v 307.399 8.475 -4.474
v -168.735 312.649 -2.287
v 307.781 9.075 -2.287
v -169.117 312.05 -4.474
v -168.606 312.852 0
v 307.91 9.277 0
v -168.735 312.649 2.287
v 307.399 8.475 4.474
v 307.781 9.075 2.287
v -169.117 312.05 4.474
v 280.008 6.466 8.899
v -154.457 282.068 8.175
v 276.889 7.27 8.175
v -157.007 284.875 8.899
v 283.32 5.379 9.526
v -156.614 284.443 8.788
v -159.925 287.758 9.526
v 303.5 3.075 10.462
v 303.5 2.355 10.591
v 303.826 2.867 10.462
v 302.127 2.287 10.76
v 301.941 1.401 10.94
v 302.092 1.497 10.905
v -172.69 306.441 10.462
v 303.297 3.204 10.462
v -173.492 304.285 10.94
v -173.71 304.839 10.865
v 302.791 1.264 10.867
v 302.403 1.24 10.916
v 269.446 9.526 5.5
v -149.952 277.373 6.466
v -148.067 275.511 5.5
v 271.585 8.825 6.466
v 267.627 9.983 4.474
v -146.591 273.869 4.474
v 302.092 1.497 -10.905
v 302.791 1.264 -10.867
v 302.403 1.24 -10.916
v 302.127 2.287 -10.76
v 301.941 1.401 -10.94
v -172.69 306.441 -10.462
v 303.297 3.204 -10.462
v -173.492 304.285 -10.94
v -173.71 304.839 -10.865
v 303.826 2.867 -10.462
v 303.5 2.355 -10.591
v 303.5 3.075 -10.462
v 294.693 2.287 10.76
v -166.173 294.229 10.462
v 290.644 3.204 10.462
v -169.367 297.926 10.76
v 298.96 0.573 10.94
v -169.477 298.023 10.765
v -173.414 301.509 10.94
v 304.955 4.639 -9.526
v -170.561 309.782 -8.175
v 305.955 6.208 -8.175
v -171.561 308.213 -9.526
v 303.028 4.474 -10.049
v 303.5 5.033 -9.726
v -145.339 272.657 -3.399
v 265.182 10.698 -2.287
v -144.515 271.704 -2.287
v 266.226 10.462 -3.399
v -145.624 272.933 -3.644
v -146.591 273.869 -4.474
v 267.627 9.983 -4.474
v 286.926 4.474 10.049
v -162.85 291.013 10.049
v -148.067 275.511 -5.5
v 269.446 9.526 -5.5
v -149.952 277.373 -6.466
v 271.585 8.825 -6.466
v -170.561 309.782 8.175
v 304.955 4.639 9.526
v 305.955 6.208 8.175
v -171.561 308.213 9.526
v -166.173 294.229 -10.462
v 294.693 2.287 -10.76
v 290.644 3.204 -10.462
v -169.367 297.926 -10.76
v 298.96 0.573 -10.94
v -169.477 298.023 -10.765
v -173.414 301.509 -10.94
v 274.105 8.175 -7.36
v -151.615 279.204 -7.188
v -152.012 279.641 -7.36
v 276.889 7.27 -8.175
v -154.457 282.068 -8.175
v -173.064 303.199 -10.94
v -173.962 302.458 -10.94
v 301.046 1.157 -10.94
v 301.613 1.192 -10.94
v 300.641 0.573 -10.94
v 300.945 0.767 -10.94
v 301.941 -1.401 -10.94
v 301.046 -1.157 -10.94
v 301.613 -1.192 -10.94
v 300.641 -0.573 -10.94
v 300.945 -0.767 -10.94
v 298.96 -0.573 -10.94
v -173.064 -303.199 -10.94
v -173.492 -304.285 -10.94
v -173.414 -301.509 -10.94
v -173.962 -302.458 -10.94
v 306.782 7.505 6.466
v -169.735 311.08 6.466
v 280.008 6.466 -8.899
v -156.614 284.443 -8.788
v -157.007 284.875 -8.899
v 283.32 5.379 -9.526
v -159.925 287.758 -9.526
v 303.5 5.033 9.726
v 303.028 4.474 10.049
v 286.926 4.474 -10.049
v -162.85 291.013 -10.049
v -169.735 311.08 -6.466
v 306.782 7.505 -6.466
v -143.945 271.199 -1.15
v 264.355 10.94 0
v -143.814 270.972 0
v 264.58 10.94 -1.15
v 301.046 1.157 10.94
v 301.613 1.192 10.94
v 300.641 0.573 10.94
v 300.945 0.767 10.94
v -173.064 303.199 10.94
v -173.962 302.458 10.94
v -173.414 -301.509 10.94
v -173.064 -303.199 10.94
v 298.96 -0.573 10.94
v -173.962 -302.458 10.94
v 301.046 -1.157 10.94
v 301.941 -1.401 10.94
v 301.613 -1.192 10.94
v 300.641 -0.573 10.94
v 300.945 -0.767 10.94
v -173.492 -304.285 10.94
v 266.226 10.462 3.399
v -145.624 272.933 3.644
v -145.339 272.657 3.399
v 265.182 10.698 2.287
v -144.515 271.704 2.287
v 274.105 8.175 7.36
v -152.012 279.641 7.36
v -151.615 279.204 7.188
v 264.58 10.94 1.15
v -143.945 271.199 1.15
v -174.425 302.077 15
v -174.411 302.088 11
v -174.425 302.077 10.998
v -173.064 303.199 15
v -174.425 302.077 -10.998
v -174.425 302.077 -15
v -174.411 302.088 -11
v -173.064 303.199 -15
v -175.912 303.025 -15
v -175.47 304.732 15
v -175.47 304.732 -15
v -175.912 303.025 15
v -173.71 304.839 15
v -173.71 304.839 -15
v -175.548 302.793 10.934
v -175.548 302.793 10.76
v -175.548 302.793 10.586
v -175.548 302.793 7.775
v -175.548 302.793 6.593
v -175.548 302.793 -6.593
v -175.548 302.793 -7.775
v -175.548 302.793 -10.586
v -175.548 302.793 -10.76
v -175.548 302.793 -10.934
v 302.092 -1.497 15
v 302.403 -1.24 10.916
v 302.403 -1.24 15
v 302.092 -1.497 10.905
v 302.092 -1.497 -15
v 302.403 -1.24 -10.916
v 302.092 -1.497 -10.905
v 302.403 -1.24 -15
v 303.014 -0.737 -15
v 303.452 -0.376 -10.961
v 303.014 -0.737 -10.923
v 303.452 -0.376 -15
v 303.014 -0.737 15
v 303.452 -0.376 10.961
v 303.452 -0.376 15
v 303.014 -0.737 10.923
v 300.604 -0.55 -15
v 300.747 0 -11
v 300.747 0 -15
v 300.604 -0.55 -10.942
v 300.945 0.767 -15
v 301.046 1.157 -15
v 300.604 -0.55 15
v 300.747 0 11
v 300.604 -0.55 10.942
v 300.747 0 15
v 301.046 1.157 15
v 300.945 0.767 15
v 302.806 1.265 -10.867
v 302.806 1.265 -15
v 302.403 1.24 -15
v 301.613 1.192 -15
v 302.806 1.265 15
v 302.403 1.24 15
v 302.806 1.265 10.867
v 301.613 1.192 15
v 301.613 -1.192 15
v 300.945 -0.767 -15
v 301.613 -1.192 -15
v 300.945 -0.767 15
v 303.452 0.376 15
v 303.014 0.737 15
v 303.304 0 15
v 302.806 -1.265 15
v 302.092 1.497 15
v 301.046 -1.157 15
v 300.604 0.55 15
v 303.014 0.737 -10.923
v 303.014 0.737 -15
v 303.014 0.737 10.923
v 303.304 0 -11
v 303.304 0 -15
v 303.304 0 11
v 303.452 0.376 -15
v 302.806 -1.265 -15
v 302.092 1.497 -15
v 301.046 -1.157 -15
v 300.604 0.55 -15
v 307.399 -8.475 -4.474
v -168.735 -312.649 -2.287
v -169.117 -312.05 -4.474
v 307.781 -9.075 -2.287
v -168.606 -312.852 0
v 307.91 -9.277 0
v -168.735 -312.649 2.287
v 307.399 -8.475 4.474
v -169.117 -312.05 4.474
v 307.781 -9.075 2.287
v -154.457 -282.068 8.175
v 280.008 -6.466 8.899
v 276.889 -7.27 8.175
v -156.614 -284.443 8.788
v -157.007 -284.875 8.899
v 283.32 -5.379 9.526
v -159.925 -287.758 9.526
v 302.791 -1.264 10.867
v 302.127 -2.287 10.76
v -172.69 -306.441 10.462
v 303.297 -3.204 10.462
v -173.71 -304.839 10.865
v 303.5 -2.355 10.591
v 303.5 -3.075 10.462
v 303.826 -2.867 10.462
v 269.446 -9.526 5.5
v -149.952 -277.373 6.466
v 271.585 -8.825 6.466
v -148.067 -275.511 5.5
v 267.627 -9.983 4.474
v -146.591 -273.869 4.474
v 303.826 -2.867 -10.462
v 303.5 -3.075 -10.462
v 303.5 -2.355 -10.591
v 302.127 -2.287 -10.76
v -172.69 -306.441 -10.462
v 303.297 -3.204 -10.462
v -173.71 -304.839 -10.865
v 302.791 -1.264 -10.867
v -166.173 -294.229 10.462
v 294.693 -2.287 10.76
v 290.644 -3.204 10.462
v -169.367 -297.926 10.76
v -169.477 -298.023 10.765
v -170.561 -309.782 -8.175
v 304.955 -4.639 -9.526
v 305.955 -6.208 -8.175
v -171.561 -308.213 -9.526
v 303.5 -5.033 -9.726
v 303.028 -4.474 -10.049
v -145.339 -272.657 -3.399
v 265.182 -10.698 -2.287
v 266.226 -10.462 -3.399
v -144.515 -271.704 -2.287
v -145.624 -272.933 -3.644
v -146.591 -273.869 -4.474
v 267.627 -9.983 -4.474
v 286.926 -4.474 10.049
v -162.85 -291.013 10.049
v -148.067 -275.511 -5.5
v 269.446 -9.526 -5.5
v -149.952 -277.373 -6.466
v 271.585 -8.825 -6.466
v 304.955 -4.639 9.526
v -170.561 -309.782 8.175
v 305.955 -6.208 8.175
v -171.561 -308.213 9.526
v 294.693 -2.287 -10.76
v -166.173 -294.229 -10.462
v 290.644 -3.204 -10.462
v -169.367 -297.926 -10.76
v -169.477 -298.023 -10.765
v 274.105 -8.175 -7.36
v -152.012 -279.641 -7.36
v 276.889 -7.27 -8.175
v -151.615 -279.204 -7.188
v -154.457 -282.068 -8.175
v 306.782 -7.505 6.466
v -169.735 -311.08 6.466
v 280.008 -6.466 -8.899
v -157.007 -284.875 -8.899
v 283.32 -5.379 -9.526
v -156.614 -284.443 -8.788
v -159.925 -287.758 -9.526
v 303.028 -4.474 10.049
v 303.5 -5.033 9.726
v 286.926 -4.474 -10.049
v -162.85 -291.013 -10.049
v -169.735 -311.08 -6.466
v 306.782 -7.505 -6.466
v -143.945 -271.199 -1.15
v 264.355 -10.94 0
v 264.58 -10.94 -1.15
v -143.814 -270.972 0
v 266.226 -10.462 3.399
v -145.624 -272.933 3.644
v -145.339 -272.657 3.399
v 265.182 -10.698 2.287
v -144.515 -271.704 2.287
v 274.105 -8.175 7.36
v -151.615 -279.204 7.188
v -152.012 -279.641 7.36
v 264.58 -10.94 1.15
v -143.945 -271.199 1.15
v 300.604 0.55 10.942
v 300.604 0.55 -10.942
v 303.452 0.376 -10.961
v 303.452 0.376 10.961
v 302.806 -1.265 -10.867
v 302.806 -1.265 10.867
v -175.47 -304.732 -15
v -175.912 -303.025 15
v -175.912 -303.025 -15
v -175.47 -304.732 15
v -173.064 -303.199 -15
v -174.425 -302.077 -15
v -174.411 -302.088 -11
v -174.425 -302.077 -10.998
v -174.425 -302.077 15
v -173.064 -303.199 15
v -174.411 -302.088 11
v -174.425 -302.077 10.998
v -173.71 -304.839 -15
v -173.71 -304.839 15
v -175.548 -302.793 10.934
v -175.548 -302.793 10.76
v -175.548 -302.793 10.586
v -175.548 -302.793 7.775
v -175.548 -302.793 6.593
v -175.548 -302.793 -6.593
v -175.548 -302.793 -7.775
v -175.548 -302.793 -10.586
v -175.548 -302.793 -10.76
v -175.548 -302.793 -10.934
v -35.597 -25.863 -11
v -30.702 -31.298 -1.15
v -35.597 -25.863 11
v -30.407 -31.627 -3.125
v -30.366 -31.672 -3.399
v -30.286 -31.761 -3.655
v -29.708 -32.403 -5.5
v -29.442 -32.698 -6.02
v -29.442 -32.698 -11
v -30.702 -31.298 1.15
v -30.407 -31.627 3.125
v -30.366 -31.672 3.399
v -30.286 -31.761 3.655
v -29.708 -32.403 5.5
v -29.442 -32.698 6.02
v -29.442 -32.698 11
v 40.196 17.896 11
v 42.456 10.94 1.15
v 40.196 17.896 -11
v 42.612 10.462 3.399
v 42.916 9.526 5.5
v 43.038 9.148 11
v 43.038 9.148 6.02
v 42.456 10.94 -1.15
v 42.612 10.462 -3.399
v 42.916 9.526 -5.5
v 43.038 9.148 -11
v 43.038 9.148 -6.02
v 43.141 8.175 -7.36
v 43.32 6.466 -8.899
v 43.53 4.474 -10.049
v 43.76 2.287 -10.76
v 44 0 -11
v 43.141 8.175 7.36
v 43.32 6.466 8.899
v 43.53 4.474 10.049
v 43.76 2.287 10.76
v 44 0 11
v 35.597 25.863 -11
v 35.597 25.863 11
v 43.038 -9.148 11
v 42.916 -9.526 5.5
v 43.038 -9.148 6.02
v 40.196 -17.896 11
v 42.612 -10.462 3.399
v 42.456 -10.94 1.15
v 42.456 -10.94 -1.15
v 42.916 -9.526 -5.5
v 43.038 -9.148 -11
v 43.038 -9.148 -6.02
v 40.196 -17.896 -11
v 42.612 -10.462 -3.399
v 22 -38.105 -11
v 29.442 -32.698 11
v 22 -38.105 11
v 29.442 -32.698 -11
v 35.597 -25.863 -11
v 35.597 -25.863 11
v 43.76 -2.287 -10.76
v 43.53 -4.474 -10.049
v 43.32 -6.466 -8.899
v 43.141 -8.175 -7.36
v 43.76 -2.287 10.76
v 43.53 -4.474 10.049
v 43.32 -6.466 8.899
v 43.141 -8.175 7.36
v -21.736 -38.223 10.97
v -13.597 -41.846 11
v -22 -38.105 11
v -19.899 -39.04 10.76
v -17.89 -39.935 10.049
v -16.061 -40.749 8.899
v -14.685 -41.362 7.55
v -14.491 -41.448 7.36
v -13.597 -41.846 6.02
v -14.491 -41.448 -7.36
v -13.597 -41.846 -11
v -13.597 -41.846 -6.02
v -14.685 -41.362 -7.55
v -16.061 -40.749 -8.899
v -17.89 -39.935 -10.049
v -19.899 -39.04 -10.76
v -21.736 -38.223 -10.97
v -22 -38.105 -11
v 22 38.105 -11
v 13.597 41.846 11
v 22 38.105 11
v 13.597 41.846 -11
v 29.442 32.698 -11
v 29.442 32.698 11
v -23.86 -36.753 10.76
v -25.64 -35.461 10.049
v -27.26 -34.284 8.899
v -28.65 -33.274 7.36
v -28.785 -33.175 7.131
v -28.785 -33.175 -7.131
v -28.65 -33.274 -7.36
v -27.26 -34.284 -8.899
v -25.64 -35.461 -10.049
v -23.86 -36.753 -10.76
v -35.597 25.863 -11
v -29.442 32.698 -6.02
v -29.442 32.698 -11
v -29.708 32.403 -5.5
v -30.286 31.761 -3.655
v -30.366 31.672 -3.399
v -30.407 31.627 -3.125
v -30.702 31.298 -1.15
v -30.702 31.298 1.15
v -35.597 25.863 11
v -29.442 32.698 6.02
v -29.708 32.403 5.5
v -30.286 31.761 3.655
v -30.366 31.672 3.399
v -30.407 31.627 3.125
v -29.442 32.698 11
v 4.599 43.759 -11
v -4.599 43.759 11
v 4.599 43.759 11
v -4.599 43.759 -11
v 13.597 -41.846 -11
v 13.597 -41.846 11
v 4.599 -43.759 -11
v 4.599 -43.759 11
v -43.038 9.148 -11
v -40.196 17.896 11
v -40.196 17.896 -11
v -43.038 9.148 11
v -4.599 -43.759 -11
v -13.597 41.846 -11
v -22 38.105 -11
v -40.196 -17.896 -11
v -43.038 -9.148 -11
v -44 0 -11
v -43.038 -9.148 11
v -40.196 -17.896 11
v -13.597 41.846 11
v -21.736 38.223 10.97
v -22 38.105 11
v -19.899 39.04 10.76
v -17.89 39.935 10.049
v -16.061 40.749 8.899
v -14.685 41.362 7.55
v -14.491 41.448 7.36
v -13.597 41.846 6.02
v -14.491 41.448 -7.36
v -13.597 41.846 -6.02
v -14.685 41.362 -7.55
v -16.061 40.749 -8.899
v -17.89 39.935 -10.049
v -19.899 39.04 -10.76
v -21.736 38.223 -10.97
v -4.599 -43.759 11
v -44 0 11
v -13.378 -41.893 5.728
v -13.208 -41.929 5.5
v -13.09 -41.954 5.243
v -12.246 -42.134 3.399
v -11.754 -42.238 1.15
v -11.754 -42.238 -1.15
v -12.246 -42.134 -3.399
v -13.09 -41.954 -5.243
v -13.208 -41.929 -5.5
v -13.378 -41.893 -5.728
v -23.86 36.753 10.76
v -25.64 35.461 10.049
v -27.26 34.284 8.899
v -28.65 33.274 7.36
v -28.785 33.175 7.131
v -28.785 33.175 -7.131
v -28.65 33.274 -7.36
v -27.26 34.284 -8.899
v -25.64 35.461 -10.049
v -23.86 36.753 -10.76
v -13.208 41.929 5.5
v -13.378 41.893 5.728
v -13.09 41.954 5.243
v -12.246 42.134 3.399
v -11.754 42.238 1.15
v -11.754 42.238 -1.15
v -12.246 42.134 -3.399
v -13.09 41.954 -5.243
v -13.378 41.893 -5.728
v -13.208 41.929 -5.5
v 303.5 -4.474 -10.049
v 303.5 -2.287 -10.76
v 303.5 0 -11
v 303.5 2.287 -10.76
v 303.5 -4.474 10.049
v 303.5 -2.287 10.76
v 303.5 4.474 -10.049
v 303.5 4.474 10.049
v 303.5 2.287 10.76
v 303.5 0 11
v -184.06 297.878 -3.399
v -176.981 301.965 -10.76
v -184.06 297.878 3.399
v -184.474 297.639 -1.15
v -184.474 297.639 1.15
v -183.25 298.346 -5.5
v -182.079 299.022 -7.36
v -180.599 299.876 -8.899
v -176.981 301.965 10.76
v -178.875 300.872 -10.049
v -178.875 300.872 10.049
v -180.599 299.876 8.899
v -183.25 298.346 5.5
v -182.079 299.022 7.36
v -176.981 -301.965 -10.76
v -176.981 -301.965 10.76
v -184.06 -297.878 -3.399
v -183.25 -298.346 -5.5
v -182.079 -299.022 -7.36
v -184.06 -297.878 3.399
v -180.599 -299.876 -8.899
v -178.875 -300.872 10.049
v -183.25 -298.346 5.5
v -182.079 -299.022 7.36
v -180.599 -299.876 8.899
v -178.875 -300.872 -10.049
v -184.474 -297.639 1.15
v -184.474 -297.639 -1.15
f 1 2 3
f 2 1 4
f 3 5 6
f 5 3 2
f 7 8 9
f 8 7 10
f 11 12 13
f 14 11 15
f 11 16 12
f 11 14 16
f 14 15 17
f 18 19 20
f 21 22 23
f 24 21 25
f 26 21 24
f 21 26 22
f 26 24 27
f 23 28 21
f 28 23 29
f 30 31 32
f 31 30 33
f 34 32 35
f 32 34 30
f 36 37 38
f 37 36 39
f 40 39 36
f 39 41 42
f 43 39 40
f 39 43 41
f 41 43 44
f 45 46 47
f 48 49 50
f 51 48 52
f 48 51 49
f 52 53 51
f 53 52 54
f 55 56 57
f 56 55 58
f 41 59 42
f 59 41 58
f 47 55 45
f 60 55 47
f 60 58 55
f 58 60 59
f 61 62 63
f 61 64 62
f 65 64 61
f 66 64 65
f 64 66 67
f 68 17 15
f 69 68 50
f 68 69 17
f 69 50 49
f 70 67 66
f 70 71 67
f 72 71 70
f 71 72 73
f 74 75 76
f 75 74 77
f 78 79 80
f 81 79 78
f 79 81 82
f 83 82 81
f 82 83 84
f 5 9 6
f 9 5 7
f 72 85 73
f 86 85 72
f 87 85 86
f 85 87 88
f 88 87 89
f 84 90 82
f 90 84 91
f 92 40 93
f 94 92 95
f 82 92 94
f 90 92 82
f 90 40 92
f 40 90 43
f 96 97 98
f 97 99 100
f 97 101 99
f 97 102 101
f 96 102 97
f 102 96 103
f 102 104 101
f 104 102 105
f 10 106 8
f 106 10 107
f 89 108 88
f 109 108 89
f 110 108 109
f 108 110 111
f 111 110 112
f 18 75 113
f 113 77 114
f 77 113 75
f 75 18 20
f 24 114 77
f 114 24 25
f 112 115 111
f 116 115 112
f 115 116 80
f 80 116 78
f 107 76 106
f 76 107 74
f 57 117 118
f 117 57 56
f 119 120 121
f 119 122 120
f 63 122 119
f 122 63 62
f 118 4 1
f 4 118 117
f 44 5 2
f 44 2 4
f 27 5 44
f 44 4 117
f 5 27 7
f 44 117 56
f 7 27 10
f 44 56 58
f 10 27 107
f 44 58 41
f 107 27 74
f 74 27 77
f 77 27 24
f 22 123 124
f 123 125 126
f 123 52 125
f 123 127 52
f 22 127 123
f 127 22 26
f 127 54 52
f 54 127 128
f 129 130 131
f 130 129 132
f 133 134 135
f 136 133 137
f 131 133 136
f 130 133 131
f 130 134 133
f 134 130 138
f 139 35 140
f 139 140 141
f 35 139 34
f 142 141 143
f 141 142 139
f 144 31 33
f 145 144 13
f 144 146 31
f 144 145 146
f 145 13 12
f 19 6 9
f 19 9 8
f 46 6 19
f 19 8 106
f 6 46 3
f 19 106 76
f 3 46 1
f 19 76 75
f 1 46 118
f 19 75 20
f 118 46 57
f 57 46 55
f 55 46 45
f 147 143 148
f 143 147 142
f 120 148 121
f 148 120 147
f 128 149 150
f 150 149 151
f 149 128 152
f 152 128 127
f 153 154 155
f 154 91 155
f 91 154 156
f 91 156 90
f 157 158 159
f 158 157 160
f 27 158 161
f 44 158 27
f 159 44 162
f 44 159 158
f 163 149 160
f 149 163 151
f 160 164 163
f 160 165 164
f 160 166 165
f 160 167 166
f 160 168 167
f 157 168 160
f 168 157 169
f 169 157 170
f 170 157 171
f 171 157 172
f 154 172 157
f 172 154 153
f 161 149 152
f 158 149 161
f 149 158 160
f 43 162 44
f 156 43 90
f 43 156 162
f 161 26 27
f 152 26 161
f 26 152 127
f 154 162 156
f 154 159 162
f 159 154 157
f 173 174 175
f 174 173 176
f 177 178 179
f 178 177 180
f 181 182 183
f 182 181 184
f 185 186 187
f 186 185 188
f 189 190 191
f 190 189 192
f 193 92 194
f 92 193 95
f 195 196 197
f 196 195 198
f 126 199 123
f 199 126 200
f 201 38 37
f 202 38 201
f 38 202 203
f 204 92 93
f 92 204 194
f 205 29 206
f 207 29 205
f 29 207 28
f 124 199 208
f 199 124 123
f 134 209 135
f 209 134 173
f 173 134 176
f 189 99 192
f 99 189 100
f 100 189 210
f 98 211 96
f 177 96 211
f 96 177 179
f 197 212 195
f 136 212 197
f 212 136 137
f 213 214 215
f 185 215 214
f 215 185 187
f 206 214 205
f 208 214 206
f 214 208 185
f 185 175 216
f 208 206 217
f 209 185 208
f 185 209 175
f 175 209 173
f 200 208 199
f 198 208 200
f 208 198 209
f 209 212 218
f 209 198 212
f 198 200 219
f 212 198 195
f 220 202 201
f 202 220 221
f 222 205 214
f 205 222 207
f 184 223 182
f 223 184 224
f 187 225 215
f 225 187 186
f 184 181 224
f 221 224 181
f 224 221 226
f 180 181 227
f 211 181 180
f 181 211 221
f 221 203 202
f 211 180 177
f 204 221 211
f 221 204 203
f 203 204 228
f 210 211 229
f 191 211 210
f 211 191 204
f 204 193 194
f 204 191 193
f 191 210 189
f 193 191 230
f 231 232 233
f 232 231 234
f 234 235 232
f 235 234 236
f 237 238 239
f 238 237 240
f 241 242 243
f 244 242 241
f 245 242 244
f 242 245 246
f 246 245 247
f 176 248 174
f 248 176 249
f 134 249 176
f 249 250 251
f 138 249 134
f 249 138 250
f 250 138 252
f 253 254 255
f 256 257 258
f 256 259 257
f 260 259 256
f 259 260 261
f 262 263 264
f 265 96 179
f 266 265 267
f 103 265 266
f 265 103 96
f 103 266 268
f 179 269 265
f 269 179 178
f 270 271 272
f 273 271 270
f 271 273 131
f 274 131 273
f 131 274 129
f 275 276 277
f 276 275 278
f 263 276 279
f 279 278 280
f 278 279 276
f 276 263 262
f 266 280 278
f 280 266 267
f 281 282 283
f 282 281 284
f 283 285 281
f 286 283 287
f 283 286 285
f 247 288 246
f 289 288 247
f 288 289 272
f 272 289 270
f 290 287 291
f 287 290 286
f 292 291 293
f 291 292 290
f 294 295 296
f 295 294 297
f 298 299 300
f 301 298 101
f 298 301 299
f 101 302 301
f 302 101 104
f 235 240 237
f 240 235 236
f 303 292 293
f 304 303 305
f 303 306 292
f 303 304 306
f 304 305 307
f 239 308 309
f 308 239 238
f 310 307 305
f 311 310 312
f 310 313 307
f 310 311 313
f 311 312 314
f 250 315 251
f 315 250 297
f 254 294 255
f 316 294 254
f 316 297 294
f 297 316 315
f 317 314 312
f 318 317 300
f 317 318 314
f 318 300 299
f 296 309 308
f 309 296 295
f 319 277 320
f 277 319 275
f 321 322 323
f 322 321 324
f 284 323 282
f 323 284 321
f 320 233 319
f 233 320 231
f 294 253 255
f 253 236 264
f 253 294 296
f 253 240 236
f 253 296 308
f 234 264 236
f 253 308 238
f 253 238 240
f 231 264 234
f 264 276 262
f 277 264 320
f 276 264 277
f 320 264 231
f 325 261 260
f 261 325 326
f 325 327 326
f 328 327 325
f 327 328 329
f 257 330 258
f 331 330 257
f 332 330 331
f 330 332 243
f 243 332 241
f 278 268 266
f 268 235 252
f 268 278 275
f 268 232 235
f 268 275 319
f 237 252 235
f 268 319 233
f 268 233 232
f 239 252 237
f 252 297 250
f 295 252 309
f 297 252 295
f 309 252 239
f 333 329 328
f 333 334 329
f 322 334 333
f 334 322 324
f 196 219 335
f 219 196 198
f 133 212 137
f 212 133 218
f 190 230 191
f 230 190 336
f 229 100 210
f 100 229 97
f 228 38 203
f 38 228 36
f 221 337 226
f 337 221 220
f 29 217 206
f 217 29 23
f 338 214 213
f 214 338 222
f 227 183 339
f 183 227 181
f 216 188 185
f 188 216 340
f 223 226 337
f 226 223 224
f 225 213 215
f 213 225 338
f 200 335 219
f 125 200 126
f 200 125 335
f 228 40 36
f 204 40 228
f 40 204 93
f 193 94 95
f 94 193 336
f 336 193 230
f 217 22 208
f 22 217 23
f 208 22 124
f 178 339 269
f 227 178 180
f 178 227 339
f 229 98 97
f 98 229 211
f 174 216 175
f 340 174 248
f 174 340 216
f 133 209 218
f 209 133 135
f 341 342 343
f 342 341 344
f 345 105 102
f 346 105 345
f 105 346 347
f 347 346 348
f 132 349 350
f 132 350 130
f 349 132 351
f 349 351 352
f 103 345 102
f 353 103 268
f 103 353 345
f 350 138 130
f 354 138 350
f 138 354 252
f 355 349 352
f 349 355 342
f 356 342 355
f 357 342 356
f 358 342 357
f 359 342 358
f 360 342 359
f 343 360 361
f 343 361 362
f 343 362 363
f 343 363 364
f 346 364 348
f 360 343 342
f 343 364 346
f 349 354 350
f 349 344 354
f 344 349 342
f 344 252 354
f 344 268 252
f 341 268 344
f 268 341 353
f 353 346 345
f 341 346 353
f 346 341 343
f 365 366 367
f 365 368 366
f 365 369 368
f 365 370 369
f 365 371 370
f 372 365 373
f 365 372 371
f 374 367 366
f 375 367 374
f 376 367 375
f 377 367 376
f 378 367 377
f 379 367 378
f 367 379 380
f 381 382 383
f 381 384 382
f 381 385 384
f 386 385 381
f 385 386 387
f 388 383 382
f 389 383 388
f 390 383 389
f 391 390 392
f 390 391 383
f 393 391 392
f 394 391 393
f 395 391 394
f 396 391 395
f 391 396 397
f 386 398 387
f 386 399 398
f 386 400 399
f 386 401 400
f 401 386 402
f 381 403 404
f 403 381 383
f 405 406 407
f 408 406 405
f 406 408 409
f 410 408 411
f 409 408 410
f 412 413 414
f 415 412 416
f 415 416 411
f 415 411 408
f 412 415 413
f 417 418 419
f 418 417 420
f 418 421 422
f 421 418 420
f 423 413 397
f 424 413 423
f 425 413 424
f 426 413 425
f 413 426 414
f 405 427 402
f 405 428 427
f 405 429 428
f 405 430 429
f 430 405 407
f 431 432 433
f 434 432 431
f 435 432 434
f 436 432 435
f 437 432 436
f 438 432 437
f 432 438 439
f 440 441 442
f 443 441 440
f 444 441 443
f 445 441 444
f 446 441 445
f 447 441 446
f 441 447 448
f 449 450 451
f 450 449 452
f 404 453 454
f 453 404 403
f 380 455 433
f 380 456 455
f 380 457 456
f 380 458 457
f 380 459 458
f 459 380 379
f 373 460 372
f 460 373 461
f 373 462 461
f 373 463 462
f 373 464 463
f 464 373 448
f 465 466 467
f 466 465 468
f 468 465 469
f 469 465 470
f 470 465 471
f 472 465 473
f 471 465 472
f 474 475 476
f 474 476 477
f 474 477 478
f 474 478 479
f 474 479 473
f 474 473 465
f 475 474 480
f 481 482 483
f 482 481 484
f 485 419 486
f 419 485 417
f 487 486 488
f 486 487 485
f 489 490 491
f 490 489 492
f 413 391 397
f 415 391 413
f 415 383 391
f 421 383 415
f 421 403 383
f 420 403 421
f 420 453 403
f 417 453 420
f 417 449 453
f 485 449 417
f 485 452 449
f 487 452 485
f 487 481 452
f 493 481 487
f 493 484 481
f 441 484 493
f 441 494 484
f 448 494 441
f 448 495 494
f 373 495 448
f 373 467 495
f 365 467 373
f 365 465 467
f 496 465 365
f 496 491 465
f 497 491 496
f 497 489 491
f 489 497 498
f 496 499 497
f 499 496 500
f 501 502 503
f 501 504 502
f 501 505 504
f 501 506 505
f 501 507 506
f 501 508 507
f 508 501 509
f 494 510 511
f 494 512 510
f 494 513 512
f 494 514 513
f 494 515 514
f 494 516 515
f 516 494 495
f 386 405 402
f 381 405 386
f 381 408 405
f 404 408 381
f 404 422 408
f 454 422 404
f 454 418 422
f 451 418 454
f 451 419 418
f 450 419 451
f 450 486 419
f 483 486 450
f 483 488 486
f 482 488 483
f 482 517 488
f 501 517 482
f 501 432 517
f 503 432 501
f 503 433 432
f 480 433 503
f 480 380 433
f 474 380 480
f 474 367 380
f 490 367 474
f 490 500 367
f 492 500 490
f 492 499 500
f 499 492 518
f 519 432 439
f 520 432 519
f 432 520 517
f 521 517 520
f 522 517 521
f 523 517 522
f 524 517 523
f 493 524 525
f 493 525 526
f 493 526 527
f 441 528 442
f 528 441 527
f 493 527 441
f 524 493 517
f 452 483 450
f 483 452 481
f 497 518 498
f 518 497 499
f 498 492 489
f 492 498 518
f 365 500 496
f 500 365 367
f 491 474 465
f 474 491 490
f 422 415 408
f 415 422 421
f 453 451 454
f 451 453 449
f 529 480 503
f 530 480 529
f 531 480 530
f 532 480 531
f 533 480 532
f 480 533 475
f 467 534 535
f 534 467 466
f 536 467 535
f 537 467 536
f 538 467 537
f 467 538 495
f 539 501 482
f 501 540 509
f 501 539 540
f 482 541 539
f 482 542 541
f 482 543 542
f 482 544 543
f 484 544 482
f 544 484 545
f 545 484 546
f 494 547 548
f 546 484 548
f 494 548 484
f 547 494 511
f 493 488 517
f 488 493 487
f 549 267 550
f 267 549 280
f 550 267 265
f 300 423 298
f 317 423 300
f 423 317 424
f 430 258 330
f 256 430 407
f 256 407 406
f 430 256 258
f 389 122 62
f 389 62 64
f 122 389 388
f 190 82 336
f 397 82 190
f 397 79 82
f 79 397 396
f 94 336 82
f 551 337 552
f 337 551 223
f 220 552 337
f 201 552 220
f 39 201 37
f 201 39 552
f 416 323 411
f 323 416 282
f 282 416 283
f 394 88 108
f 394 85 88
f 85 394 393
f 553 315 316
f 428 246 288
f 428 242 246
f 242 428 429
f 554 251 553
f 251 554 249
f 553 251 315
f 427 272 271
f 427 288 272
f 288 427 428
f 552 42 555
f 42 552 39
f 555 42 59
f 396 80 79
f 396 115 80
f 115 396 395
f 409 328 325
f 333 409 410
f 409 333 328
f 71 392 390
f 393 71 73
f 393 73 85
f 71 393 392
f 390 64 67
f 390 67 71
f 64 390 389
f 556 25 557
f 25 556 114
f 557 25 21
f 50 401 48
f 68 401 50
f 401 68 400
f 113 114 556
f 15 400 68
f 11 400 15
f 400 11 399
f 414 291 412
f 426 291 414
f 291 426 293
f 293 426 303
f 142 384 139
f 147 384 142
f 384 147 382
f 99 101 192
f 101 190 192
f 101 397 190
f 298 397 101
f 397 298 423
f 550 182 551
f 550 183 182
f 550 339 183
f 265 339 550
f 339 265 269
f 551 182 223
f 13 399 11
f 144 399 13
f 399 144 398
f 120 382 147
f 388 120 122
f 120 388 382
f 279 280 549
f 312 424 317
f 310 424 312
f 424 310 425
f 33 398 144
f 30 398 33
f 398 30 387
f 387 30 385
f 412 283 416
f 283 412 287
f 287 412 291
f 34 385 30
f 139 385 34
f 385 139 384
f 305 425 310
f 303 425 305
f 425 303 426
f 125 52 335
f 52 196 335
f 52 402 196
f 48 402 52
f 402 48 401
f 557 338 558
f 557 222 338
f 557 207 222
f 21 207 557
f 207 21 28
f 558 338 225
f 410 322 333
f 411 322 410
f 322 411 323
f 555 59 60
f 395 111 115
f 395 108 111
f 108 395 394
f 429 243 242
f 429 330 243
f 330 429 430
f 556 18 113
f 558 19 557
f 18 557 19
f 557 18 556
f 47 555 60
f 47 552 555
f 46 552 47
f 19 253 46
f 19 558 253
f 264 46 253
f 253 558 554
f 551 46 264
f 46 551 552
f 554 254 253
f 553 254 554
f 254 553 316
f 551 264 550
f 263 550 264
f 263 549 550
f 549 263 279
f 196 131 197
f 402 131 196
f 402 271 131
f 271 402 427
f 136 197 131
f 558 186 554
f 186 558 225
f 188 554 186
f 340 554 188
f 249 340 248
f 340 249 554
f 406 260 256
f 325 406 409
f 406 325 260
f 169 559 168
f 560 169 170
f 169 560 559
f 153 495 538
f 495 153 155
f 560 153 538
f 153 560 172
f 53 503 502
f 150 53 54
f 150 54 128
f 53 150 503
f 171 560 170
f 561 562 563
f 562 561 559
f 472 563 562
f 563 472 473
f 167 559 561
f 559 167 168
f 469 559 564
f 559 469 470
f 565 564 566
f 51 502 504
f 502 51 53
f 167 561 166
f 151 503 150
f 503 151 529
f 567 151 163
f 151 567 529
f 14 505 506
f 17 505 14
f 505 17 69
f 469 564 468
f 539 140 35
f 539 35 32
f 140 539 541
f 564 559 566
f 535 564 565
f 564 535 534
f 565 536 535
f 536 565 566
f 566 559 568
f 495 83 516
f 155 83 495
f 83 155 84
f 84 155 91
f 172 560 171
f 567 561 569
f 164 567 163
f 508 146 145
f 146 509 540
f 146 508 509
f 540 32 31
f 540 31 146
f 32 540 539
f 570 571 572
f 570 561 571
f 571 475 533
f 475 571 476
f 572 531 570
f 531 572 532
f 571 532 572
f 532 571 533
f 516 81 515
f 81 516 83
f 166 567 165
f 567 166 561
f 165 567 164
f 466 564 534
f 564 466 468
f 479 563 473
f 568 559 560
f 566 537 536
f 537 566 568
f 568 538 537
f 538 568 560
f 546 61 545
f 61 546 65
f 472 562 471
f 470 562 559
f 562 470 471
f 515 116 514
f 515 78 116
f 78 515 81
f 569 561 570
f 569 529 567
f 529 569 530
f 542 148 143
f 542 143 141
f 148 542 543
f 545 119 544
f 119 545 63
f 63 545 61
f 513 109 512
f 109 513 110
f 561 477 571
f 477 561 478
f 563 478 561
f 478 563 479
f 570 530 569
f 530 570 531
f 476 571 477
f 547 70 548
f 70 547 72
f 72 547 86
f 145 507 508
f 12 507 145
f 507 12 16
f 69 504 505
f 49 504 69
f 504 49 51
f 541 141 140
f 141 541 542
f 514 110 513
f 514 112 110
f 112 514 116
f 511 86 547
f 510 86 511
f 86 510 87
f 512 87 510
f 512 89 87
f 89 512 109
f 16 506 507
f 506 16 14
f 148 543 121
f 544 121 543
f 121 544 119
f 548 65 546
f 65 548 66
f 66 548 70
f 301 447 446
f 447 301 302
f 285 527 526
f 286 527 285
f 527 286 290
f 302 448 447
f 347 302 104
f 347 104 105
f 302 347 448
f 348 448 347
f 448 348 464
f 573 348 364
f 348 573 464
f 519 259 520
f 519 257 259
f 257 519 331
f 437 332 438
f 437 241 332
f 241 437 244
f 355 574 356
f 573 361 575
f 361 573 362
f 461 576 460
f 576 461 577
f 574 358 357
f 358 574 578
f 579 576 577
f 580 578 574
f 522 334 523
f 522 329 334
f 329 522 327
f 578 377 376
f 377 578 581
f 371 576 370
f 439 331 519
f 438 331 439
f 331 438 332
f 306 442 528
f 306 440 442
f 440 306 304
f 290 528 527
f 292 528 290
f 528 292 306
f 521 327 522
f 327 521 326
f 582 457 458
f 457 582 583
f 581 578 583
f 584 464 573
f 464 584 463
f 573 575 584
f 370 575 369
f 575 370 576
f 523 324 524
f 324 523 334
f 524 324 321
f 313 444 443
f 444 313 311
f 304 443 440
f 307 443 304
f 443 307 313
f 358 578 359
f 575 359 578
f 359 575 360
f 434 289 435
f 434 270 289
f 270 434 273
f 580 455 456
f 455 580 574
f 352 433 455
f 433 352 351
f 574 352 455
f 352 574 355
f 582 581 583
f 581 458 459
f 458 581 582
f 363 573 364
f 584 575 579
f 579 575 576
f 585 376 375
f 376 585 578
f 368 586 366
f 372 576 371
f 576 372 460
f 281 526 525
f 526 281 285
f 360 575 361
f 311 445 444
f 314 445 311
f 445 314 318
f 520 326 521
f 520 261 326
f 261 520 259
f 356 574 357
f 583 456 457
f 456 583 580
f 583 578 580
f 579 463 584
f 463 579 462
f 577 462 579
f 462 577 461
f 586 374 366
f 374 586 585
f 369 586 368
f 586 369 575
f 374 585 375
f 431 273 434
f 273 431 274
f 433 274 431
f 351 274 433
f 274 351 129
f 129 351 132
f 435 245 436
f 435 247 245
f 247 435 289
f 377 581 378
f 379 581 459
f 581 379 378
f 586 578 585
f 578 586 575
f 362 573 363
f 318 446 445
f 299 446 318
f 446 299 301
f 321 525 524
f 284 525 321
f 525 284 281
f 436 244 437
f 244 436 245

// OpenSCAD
trosDia = 3;
tubeDia = 22;
triaSide = 565;
triaBack = 607;

CraspTria();

module CraspTria() {


    translate([302, 0, 0]) 
    rotate([0,0,57.5])
    translate([0, triaSide/2, 0]) 
    Side();
    
    translate([302, 0, 0]) 
    rotate([0,0,-57.5])
    translate([0, -triaSide/2, 0]) 
    Side();
    
    cylinder(h=tubeDia, r=tubeDia*2, center=true);
    
    rotate([0, 90, 0]) 
    cylinder(h=triaBack/2, r=tubeDia/2);
    
    rotate([0, 0, 120]) 
    rotate([0, 90, 0]) 
    cylinder(h=350, r=tubeDia/2);
    
    rotate([0, 0, -120]) 
    rotate([0, 90, 0]) 
    cylinder(h=350, r=tubeDia/2);
}

module Side() {
    rotate([-90,0,0]) 
    cylinder(h=triaSide, r=tubeDia/2, center=true);
    
    translate([0, triaSide/2, 0])
    cylinder(h=30, r=trosDia/2, center=true);
    
    translate([0, -triaSide/2, 0])
    cylinder(h=30, r=trosDia/2, center=true);

}
